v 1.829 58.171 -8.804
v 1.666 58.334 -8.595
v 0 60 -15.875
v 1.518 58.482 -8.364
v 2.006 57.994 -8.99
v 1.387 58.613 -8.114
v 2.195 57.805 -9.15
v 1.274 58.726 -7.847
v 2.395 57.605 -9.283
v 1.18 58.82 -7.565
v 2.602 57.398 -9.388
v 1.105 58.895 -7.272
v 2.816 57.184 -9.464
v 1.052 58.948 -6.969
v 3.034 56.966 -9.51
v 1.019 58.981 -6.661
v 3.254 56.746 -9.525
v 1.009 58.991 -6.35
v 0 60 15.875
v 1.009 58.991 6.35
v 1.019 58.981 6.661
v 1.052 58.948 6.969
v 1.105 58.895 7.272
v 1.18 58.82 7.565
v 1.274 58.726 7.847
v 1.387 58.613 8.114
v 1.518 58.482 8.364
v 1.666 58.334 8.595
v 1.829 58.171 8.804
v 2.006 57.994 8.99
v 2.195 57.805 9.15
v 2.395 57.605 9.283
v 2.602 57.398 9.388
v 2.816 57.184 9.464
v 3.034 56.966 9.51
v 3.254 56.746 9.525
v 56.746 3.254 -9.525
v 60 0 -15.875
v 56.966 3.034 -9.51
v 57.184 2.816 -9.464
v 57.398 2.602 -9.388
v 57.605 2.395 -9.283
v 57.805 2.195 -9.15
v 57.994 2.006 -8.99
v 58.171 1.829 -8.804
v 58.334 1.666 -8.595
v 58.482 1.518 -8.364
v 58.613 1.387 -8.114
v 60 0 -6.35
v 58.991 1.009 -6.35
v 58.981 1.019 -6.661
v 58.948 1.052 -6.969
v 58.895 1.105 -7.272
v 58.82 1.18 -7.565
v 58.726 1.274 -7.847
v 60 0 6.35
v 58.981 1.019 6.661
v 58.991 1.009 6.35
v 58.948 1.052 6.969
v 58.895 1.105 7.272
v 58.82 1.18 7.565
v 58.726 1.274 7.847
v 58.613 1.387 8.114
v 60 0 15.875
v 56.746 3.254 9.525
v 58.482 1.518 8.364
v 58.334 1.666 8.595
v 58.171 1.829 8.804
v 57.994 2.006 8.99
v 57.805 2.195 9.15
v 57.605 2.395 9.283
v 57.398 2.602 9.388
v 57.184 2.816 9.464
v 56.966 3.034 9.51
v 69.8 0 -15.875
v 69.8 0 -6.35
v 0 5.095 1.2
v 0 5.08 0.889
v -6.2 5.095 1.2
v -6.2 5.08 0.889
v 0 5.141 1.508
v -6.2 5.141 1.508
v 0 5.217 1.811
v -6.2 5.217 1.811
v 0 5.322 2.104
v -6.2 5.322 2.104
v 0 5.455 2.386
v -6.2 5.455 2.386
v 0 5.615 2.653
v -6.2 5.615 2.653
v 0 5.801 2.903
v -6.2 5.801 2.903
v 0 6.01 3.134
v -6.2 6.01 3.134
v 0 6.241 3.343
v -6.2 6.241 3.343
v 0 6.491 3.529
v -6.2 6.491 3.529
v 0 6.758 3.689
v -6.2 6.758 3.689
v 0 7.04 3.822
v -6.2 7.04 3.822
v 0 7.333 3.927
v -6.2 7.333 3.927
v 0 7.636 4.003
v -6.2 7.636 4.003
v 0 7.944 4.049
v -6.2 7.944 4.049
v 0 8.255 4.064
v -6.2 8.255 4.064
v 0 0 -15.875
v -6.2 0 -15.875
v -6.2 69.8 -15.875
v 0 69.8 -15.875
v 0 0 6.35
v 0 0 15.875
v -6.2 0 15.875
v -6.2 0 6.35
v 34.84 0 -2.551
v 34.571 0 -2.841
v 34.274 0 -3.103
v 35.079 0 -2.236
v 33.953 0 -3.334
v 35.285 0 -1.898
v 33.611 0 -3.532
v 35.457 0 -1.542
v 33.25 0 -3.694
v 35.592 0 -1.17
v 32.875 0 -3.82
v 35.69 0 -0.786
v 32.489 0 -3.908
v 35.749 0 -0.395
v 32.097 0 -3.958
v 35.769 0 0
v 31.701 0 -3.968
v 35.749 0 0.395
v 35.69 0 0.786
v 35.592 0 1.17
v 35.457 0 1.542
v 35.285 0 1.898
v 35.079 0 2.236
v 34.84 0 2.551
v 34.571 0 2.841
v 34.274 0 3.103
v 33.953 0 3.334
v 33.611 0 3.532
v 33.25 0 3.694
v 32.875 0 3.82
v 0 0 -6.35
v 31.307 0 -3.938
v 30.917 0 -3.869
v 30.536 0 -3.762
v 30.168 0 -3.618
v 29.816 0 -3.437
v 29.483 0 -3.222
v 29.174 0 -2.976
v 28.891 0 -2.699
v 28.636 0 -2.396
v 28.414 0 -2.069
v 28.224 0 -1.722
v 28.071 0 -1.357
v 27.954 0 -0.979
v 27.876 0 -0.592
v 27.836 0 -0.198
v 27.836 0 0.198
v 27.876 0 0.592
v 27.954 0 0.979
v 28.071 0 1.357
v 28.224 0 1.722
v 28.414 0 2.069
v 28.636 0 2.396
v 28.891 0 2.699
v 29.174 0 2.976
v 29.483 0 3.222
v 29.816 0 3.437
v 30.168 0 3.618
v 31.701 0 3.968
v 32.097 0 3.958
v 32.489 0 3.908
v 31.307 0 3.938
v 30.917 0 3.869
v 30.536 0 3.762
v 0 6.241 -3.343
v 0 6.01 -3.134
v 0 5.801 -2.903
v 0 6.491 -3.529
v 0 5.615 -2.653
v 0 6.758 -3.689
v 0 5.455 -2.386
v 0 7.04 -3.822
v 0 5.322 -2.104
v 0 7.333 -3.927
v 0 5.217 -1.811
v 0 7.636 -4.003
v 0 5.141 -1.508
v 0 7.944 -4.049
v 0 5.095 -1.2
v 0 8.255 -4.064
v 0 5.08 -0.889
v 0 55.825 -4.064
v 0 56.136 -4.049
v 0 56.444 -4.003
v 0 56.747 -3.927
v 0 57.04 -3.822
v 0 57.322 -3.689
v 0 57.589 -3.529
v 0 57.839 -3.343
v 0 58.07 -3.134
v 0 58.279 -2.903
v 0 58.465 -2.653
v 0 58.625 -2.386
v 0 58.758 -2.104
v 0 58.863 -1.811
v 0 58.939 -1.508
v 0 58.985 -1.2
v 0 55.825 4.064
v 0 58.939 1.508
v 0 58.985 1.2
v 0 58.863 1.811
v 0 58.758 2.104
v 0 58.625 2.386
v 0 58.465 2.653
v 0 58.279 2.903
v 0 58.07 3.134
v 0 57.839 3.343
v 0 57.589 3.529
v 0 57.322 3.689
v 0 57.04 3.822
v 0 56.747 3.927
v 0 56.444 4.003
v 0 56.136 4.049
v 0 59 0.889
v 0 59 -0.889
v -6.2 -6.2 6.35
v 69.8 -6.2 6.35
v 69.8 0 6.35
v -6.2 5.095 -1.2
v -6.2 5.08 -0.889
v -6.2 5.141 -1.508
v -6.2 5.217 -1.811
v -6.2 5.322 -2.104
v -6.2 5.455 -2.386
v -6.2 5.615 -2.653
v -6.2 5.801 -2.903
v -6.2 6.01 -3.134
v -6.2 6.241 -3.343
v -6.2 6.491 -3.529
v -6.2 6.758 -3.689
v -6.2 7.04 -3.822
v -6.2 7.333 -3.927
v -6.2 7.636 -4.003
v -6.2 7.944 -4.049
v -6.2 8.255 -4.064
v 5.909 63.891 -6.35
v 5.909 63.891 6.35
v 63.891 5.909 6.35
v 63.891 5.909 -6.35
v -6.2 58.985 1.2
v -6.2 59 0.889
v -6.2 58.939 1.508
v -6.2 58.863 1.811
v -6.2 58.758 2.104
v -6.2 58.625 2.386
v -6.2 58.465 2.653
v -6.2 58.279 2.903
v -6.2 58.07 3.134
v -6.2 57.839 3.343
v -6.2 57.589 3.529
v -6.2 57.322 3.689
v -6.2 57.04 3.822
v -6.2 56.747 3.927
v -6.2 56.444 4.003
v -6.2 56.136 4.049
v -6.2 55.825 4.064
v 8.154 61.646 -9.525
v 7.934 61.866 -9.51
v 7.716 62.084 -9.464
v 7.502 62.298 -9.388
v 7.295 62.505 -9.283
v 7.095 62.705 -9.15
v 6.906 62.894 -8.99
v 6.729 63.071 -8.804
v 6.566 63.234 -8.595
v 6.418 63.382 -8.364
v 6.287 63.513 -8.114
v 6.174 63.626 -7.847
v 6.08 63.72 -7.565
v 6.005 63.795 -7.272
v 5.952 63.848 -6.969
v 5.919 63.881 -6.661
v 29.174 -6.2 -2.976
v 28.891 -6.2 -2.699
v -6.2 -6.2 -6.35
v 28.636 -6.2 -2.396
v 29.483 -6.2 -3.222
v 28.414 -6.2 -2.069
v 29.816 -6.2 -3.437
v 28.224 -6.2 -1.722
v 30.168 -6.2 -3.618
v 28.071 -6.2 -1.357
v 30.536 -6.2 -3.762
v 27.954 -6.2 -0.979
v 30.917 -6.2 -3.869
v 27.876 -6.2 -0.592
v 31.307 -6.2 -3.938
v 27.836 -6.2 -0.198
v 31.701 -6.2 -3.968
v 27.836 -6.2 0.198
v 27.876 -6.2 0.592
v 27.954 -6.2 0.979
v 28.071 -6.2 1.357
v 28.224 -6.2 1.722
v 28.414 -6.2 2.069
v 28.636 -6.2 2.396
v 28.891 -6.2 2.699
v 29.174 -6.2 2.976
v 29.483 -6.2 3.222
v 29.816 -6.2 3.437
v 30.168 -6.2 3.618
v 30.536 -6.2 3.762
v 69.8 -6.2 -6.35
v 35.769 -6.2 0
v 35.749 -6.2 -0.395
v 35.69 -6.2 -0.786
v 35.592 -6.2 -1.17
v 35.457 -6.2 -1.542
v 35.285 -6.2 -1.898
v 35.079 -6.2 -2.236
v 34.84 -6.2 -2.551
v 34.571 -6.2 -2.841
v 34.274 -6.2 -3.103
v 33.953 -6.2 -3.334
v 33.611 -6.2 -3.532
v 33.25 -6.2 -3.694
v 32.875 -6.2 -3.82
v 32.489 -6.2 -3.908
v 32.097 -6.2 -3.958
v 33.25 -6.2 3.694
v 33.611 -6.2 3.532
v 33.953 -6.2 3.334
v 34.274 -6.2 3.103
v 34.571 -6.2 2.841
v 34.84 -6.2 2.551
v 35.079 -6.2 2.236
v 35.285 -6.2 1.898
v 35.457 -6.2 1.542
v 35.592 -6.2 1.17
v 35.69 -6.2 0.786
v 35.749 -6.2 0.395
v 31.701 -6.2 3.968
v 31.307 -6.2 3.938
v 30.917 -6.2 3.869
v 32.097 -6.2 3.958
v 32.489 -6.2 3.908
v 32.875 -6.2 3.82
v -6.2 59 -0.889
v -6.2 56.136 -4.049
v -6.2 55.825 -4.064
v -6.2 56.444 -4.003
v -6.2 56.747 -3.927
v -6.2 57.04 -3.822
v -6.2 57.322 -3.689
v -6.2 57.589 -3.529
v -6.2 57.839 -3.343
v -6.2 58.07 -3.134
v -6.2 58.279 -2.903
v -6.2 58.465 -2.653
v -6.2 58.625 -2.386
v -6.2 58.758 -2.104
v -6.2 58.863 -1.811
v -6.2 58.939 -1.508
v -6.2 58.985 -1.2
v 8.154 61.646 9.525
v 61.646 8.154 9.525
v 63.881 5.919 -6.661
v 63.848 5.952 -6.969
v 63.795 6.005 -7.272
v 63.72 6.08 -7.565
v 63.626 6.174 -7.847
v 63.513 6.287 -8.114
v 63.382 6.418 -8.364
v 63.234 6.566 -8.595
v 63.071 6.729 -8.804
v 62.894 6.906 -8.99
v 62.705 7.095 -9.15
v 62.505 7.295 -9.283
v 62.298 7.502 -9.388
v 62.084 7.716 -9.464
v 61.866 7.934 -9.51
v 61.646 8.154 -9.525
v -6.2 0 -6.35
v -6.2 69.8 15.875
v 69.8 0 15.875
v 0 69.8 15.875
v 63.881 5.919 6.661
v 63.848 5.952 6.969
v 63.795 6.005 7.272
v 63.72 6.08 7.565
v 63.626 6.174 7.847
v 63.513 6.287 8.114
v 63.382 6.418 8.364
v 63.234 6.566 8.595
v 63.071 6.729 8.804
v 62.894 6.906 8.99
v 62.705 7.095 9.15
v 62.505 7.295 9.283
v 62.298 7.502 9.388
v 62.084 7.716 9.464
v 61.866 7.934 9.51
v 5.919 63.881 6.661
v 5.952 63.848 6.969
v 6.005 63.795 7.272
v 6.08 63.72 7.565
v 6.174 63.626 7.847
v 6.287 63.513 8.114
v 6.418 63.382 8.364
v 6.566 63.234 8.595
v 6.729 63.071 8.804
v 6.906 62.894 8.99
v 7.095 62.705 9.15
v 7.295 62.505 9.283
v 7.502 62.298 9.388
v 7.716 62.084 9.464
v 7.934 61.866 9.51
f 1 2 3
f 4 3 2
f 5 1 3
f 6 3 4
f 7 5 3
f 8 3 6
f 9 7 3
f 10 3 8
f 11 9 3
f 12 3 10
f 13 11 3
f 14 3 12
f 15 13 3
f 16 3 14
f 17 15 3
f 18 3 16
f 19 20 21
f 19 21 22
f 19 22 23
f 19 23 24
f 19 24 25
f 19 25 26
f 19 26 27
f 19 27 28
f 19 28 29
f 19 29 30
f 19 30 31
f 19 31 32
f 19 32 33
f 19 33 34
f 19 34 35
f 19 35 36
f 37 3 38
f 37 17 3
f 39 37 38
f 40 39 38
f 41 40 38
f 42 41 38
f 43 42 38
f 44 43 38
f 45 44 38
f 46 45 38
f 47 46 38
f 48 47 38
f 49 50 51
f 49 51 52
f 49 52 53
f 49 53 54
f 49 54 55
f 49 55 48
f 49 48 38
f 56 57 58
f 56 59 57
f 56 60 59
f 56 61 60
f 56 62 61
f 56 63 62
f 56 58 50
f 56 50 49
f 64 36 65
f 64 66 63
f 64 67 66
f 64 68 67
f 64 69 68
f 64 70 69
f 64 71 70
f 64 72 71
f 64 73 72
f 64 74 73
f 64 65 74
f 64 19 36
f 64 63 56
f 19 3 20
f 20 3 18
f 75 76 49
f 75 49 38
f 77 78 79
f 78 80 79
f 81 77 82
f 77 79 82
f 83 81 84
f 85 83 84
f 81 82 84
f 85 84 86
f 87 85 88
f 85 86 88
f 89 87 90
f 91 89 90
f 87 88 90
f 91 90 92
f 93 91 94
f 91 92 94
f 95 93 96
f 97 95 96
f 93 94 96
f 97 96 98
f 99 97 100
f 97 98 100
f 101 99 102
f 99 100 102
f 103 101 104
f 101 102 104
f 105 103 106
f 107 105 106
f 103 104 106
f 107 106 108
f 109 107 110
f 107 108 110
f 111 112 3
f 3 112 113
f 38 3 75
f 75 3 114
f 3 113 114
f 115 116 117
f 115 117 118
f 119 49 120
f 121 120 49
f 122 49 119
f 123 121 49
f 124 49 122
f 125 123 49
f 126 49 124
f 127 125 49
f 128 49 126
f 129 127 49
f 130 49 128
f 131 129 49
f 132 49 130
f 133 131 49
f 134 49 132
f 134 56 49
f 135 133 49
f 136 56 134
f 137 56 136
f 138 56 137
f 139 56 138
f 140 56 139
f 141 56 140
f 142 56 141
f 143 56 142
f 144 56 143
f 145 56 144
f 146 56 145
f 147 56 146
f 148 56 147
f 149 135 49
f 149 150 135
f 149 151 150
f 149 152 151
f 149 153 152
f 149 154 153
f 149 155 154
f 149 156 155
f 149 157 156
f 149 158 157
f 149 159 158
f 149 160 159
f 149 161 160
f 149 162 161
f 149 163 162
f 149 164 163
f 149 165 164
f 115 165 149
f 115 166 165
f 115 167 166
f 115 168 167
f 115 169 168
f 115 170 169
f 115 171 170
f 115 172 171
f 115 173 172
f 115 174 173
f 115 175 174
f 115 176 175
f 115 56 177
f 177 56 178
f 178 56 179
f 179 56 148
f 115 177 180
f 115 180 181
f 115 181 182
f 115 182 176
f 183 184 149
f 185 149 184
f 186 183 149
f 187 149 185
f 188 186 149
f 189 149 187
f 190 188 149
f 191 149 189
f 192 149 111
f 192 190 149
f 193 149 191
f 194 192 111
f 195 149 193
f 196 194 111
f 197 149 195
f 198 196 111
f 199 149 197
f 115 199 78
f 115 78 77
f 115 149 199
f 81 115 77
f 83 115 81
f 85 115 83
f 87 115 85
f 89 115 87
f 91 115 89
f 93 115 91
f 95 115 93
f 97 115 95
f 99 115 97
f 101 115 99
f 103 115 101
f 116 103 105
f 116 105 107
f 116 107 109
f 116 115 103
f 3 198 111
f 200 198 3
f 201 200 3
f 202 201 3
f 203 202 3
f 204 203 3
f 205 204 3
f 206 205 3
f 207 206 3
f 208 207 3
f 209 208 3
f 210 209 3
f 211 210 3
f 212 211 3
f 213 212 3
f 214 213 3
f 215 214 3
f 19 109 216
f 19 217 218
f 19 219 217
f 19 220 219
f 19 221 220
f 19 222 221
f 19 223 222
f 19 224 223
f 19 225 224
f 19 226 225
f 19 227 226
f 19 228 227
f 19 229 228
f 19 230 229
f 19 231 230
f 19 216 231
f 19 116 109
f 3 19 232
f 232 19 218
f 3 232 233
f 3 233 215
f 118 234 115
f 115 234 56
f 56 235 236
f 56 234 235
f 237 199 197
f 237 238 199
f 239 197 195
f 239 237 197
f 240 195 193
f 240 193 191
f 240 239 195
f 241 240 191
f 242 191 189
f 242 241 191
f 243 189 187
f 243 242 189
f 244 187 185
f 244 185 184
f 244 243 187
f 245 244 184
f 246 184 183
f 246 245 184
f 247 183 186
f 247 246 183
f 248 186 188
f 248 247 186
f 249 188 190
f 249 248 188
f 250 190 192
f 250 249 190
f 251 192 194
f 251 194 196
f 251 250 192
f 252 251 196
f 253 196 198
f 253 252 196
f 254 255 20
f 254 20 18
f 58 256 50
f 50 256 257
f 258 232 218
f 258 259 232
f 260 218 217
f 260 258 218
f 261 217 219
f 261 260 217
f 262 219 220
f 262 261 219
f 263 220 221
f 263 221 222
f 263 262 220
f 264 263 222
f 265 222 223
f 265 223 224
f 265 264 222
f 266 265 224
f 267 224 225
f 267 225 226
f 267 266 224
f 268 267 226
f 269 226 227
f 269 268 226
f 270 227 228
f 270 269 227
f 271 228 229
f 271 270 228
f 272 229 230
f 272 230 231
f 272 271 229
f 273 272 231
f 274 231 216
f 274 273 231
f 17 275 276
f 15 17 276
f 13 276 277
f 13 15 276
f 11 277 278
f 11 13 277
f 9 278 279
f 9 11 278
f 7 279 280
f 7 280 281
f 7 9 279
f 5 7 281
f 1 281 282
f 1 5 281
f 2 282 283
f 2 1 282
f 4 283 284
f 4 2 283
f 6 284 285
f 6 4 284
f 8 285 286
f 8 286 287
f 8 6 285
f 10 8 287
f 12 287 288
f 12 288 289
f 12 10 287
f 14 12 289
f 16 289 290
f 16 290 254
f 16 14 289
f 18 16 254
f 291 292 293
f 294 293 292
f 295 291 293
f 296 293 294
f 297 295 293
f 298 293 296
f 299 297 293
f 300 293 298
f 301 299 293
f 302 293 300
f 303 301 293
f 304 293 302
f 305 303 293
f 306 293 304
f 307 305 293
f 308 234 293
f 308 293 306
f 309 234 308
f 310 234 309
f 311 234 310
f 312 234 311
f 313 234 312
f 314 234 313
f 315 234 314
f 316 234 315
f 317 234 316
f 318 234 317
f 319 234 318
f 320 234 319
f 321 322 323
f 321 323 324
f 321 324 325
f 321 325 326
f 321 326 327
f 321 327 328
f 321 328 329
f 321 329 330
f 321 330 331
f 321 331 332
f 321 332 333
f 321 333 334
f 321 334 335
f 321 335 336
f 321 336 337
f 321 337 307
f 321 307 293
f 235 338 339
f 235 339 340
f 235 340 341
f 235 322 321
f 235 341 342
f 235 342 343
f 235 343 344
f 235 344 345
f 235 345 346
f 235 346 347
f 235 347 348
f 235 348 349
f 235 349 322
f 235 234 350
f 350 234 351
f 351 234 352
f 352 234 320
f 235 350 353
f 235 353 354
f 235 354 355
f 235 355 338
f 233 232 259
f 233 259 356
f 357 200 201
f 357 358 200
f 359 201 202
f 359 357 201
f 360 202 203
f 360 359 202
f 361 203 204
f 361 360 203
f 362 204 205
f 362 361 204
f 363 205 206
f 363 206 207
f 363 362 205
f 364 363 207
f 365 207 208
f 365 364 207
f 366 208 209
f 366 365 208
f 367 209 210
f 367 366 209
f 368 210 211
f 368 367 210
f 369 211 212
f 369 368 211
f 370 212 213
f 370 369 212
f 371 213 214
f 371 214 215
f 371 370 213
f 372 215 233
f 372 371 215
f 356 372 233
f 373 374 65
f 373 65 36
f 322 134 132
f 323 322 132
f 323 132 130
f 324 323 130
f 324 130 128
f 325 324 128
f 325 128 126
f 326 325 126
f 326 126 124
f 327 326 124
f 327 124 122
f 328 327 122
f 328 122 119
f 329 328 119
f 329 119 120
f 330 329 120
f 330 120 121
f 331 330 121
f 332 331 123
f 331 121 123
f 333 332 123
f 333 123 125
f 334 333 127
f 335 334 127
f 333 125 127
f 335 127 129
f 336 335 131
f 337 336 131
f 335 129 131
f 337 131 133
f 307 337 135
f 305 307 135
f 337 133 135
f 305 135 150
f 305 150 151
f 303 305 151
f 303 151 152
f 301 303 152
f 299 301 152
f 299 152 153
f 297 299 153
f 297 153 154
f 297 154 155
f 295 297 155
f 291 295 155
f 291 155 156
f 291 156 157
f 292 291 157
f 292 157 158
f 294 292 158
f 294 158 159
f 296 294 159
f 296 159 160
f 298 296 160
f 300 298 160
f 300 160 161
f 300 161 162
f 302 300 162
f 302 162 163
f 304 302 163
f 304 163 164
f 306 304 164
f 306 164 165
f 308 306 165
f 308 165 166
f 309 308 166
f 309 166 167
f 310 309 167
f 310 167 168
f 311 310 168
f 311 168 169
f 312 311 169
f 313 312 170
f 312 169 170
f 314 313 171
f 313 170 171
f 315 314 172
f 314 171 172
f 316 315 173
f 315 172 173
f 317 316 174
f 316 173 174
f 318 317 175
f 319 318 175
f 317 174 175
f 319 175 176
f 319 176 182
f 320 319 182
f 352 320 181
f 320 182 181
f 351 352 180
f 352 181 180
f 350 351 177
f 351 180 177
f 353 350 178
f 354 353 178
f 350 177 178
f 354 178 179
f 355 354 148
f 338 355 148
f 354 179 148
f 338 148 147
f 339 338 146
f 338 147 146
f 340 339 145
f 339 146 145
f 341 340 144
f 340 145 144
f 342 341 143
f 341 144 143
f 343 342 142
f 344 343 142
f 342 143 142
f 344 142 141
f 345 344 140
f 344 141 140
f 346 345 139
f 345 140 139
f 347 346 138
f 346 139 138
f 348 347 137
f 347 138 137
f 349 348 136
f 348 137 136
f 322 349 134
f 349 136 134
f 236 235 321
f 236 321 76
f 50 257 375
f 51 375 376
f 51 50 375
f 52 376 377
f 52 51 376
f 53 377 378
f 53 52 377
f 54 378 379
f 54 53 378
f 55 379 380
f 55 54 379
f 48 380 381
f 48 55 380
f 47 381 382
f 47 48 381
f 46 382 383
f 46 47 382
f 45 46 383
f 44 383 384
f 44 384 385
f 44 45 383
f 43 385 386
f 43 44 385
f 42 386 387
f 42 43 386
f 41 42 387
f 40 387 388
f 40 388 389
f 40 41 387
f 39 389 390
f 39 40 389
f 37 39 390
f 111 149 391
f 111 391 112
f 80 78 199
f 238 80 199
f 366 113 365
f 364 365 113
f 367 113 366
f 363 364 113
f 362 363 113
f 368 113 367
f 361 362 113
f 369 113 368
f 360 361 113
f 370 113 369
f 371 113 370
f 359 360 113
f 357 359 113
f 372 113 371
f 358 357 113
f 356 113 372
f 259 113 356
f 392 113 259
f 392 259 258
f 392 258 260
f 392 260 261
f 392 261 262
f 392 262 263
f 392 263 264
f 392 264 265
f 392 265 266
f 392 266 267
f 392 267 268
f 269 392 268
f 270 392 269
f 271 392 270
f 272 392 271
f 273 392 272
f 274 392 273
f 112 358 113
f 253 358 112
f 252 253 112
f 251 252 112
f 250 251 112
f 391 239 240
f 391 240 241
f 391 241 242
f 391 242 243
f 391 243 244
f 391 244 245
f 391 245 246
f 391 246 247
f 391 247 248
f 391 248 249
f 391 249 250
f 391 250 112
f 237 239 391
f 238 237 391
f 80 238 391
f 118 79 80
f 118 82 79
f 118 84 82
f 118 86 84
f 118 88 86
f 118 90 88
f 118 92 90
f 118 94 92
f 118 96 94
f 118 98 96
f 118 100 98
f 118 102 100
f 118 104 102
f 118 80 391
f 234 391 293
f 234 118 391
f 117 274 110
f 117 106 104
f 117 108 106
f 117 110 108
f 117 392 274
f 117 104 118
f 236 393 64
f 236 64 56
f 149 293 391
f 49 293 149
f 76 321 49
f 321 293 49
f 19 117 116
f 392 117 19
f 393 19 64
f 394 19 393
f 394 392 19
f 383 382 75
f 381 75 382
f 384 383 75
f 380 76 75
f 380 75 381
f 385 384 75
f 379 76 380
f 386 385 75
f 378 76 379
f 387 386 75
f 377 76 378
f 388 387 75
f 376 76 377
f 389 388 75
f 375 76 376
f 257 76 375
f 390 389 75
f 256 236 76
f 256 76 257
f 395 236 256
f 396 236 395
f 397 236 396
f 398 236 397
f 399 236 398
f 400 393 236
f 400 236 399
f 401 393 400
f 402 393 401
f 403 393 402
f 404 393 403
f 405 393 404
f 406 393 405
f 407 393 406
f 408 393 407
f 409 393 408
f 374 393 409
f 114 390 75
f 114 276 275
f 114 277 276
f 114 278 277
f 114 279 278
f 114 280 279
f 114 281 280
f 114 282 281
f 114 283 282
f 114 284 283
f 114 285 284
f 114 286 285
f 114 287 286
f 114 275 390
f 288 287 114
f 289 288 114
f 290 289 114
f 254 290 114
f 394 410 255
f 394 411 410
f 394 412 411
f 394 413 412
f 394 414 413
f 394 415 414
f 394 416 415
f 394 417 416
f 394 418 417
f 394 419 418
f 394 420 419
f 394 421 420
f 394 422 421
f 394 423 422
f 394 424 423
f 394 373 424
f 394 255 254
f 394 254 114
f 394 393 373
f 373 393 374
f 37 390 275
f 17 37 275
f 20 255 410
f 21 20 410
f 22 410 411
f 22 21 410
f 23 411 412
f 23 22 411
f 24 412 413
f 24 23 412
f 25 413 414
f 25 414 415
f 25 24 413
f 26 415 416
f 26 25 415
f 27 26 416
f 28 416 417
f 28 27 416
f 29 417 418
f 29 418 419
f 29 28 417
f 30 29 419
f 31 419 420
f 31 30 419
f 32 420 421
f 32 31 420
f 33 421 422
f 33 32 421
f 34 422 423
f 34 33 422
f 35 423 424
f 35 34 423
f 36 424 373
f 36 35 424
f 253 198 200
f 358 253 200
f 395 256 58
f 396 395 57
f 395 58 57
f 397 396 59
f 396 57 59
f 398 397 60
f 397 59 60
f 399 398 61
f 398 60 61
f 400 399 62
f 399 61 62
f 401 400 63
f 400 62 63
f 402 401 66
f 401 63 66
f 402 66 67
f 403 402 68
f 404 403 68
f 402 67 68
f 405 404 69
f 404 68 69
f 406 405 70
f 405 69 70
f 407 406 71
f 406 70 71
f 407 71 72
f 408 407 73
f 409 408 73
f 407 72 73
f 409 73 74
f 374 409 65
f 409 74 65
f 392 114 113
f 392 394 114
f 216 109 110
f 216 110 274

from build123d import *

# Parameters (mm, degrees)
BOSS_EXTRUDE1_DEPTH            = 15.875
CUT_EXTRUDE1_REACH             = 62.253
SKETCH2_W                      = 19.05
SKETCH2_H                      = 82
CUT_EXTRUDE2_REACH             = 101.98
SKETCH3_W                      = 8.128
SKETCH3_H                      = 53.92
CUT_EXTRUDE3_REACH             = 106.403
SKETCH4_W                      = 9.525
SKETCH4_H                      = 6.2
F_5_16_0_3125_DIAMETER_HOLE1_D = 7.9375
FILLET1_R                      = 3.175
FILLET2_R                      = 3.175


with BuildPart() as part:
    # Sketch1 → Boss-Extrude1 (new, symmetric)
    with BuildSketch(Plane.XY):
        Polygon((-6.2, 69.8), (-6.2, -6.2), (69.8, -6.2), (69.8, 0), (0, 69.8), align=None)
        Polygon((0, 60), (60, 0), (0, 0), align=None, mode=Mode.SUBTRACT)
    extrude(amount=BOSS_EXTRUDE1_DEPTH, both=True)

    # Sketch2 → Cut-Extrude1 (cut, up to next)
    with BuildSketch(Plane(origin=(34.9, 34.9, 0), x_dir=(0, 0, -1), z_dir=(0.7071067811865475, 0.7071067811865476, 0)), mode=Mode.PRIVATE) as cut_extrude1_sk1:
        Rectangle(SKETCH2_W, SKETCH2_H)
    cut_extrude1_tool1 = extrude(cut_extrude1_sk1.sketch, amount=-CUT_EXTRUDE1_REACH, mode=Mode.PRIVATE) & part.part
    add(cut_extrude1_tool1.solids().sort_by_distance((34.9, 34.9, 0))[0], mode=Mode.SUBTRACT)

    # Sketch3 → Cut-Extrude2 (cut, up to next)
    with BuildSketch(Plane(origin=(0, 0, 0), x_dir=(0, 0, -1), z_dir=(1, 0, 0)), mode=Mode.PRIVATE) as cut_extrude2_sk1:
        with Locations((0, 32.04)):
            Rectangle(SKETCH3_W, SKETCH3_H)
    cut_extrude2_tool1 = extrude(cut_extrude2_sk1.sketch, amount=-CUT_EXTRUDE2_REACH, mode=Mode.PRIVATE) & part.part
    add(cut_extrude2_tool1.solids().sort_by_distance((0, 32.04, 0))[0], mode=Mode.SUBTRACT)

    # Sketch4 → Cut-Extrude3 (cut, up to next)
    with BuildSketch(Plane(origin=(69.8, 0, 0), x_dir=(0, 0, -1), z_dir=(1, 0, 0)), mode=Mode.PRIVATE) as cut_extrude3_sk1:
        with Locations((-11.1125, -3.1)):
            Rectangle(SKETCH4_W, SKETCH4_H)
    cut_extrude3_tool1 = extrude(cut_extrude3_sk1.sketch, amount=-CUT_EXTRUDE3_REACH, mode=Mode.PRIVATE) & part.part
    # Sketch4 → Cut-Extrude3 (cut, up to next)
    with BuildSketch(Plane(origin=(69.8, 0, 0), x_dir=(0, 0, -1), z_dir=(1, 0, 0)), mode=Mode.PRIVATE) as cut_extrude3_sk2:
        with Locations((11.1125, -3.1)):
            Rectangle(SKETCH4_W, SKETCH4_H)
    cut_extrude3_tool2 = extrude(cut_extrude3_sk2.sketch, amount=-CUT_EXTRUDE3_REACH, mode=Mode.PRIVATE) & part.part
    add(cut_extrude3_tool1.solids().sort_by_distance((69.8, -3.1, 11.1125))[0], mode=Mode.SUBTRACT)
    add(cut_extrude3_tool2.solids().sort_by_distance((69.8, -3.1, -11.1125))[0], mode=Mode.SUBTRACT)

    # 5/16 (0.3125) Diameter Hole1 (through all)
    with Locations(Plane(origin=(0, -6.2, 0), x_dir=(-1, 0, 0), z_dir=(0, -1, 0))):
        with Locations((-31.8, 0)):
            Hole(F_5_16_0_3125_DIAMETER_HOLE1_D / 2)

    # Fillet1
    fillet1_edges = [part.edges().sort_by_distance(p)[0] for p in [
        (3.458621971, 61.441378029, 9.525),
        (61.441378029, 3.458621971, 9.525),
        (61.441378029, 3.458621971, -9.525),
        (3.458621971, 61.441378029, -9.525),
    ]]
    fillet(fillet1_edges, radius=FILLET1_R)

    # Fillet2
    fillet2_edges = [part.edges().sort_by_distance(p)[0] for p in [
        (-3.1, 59, -4.064),
        (-3.1, 5.08, -4.064),
        (-3.1, 5.08, 4.064),
        (-3.1, 59, 4.064),
    ]]
    fillet(fillet2_edges, radius=FILLET2_R)


solid = part.part
